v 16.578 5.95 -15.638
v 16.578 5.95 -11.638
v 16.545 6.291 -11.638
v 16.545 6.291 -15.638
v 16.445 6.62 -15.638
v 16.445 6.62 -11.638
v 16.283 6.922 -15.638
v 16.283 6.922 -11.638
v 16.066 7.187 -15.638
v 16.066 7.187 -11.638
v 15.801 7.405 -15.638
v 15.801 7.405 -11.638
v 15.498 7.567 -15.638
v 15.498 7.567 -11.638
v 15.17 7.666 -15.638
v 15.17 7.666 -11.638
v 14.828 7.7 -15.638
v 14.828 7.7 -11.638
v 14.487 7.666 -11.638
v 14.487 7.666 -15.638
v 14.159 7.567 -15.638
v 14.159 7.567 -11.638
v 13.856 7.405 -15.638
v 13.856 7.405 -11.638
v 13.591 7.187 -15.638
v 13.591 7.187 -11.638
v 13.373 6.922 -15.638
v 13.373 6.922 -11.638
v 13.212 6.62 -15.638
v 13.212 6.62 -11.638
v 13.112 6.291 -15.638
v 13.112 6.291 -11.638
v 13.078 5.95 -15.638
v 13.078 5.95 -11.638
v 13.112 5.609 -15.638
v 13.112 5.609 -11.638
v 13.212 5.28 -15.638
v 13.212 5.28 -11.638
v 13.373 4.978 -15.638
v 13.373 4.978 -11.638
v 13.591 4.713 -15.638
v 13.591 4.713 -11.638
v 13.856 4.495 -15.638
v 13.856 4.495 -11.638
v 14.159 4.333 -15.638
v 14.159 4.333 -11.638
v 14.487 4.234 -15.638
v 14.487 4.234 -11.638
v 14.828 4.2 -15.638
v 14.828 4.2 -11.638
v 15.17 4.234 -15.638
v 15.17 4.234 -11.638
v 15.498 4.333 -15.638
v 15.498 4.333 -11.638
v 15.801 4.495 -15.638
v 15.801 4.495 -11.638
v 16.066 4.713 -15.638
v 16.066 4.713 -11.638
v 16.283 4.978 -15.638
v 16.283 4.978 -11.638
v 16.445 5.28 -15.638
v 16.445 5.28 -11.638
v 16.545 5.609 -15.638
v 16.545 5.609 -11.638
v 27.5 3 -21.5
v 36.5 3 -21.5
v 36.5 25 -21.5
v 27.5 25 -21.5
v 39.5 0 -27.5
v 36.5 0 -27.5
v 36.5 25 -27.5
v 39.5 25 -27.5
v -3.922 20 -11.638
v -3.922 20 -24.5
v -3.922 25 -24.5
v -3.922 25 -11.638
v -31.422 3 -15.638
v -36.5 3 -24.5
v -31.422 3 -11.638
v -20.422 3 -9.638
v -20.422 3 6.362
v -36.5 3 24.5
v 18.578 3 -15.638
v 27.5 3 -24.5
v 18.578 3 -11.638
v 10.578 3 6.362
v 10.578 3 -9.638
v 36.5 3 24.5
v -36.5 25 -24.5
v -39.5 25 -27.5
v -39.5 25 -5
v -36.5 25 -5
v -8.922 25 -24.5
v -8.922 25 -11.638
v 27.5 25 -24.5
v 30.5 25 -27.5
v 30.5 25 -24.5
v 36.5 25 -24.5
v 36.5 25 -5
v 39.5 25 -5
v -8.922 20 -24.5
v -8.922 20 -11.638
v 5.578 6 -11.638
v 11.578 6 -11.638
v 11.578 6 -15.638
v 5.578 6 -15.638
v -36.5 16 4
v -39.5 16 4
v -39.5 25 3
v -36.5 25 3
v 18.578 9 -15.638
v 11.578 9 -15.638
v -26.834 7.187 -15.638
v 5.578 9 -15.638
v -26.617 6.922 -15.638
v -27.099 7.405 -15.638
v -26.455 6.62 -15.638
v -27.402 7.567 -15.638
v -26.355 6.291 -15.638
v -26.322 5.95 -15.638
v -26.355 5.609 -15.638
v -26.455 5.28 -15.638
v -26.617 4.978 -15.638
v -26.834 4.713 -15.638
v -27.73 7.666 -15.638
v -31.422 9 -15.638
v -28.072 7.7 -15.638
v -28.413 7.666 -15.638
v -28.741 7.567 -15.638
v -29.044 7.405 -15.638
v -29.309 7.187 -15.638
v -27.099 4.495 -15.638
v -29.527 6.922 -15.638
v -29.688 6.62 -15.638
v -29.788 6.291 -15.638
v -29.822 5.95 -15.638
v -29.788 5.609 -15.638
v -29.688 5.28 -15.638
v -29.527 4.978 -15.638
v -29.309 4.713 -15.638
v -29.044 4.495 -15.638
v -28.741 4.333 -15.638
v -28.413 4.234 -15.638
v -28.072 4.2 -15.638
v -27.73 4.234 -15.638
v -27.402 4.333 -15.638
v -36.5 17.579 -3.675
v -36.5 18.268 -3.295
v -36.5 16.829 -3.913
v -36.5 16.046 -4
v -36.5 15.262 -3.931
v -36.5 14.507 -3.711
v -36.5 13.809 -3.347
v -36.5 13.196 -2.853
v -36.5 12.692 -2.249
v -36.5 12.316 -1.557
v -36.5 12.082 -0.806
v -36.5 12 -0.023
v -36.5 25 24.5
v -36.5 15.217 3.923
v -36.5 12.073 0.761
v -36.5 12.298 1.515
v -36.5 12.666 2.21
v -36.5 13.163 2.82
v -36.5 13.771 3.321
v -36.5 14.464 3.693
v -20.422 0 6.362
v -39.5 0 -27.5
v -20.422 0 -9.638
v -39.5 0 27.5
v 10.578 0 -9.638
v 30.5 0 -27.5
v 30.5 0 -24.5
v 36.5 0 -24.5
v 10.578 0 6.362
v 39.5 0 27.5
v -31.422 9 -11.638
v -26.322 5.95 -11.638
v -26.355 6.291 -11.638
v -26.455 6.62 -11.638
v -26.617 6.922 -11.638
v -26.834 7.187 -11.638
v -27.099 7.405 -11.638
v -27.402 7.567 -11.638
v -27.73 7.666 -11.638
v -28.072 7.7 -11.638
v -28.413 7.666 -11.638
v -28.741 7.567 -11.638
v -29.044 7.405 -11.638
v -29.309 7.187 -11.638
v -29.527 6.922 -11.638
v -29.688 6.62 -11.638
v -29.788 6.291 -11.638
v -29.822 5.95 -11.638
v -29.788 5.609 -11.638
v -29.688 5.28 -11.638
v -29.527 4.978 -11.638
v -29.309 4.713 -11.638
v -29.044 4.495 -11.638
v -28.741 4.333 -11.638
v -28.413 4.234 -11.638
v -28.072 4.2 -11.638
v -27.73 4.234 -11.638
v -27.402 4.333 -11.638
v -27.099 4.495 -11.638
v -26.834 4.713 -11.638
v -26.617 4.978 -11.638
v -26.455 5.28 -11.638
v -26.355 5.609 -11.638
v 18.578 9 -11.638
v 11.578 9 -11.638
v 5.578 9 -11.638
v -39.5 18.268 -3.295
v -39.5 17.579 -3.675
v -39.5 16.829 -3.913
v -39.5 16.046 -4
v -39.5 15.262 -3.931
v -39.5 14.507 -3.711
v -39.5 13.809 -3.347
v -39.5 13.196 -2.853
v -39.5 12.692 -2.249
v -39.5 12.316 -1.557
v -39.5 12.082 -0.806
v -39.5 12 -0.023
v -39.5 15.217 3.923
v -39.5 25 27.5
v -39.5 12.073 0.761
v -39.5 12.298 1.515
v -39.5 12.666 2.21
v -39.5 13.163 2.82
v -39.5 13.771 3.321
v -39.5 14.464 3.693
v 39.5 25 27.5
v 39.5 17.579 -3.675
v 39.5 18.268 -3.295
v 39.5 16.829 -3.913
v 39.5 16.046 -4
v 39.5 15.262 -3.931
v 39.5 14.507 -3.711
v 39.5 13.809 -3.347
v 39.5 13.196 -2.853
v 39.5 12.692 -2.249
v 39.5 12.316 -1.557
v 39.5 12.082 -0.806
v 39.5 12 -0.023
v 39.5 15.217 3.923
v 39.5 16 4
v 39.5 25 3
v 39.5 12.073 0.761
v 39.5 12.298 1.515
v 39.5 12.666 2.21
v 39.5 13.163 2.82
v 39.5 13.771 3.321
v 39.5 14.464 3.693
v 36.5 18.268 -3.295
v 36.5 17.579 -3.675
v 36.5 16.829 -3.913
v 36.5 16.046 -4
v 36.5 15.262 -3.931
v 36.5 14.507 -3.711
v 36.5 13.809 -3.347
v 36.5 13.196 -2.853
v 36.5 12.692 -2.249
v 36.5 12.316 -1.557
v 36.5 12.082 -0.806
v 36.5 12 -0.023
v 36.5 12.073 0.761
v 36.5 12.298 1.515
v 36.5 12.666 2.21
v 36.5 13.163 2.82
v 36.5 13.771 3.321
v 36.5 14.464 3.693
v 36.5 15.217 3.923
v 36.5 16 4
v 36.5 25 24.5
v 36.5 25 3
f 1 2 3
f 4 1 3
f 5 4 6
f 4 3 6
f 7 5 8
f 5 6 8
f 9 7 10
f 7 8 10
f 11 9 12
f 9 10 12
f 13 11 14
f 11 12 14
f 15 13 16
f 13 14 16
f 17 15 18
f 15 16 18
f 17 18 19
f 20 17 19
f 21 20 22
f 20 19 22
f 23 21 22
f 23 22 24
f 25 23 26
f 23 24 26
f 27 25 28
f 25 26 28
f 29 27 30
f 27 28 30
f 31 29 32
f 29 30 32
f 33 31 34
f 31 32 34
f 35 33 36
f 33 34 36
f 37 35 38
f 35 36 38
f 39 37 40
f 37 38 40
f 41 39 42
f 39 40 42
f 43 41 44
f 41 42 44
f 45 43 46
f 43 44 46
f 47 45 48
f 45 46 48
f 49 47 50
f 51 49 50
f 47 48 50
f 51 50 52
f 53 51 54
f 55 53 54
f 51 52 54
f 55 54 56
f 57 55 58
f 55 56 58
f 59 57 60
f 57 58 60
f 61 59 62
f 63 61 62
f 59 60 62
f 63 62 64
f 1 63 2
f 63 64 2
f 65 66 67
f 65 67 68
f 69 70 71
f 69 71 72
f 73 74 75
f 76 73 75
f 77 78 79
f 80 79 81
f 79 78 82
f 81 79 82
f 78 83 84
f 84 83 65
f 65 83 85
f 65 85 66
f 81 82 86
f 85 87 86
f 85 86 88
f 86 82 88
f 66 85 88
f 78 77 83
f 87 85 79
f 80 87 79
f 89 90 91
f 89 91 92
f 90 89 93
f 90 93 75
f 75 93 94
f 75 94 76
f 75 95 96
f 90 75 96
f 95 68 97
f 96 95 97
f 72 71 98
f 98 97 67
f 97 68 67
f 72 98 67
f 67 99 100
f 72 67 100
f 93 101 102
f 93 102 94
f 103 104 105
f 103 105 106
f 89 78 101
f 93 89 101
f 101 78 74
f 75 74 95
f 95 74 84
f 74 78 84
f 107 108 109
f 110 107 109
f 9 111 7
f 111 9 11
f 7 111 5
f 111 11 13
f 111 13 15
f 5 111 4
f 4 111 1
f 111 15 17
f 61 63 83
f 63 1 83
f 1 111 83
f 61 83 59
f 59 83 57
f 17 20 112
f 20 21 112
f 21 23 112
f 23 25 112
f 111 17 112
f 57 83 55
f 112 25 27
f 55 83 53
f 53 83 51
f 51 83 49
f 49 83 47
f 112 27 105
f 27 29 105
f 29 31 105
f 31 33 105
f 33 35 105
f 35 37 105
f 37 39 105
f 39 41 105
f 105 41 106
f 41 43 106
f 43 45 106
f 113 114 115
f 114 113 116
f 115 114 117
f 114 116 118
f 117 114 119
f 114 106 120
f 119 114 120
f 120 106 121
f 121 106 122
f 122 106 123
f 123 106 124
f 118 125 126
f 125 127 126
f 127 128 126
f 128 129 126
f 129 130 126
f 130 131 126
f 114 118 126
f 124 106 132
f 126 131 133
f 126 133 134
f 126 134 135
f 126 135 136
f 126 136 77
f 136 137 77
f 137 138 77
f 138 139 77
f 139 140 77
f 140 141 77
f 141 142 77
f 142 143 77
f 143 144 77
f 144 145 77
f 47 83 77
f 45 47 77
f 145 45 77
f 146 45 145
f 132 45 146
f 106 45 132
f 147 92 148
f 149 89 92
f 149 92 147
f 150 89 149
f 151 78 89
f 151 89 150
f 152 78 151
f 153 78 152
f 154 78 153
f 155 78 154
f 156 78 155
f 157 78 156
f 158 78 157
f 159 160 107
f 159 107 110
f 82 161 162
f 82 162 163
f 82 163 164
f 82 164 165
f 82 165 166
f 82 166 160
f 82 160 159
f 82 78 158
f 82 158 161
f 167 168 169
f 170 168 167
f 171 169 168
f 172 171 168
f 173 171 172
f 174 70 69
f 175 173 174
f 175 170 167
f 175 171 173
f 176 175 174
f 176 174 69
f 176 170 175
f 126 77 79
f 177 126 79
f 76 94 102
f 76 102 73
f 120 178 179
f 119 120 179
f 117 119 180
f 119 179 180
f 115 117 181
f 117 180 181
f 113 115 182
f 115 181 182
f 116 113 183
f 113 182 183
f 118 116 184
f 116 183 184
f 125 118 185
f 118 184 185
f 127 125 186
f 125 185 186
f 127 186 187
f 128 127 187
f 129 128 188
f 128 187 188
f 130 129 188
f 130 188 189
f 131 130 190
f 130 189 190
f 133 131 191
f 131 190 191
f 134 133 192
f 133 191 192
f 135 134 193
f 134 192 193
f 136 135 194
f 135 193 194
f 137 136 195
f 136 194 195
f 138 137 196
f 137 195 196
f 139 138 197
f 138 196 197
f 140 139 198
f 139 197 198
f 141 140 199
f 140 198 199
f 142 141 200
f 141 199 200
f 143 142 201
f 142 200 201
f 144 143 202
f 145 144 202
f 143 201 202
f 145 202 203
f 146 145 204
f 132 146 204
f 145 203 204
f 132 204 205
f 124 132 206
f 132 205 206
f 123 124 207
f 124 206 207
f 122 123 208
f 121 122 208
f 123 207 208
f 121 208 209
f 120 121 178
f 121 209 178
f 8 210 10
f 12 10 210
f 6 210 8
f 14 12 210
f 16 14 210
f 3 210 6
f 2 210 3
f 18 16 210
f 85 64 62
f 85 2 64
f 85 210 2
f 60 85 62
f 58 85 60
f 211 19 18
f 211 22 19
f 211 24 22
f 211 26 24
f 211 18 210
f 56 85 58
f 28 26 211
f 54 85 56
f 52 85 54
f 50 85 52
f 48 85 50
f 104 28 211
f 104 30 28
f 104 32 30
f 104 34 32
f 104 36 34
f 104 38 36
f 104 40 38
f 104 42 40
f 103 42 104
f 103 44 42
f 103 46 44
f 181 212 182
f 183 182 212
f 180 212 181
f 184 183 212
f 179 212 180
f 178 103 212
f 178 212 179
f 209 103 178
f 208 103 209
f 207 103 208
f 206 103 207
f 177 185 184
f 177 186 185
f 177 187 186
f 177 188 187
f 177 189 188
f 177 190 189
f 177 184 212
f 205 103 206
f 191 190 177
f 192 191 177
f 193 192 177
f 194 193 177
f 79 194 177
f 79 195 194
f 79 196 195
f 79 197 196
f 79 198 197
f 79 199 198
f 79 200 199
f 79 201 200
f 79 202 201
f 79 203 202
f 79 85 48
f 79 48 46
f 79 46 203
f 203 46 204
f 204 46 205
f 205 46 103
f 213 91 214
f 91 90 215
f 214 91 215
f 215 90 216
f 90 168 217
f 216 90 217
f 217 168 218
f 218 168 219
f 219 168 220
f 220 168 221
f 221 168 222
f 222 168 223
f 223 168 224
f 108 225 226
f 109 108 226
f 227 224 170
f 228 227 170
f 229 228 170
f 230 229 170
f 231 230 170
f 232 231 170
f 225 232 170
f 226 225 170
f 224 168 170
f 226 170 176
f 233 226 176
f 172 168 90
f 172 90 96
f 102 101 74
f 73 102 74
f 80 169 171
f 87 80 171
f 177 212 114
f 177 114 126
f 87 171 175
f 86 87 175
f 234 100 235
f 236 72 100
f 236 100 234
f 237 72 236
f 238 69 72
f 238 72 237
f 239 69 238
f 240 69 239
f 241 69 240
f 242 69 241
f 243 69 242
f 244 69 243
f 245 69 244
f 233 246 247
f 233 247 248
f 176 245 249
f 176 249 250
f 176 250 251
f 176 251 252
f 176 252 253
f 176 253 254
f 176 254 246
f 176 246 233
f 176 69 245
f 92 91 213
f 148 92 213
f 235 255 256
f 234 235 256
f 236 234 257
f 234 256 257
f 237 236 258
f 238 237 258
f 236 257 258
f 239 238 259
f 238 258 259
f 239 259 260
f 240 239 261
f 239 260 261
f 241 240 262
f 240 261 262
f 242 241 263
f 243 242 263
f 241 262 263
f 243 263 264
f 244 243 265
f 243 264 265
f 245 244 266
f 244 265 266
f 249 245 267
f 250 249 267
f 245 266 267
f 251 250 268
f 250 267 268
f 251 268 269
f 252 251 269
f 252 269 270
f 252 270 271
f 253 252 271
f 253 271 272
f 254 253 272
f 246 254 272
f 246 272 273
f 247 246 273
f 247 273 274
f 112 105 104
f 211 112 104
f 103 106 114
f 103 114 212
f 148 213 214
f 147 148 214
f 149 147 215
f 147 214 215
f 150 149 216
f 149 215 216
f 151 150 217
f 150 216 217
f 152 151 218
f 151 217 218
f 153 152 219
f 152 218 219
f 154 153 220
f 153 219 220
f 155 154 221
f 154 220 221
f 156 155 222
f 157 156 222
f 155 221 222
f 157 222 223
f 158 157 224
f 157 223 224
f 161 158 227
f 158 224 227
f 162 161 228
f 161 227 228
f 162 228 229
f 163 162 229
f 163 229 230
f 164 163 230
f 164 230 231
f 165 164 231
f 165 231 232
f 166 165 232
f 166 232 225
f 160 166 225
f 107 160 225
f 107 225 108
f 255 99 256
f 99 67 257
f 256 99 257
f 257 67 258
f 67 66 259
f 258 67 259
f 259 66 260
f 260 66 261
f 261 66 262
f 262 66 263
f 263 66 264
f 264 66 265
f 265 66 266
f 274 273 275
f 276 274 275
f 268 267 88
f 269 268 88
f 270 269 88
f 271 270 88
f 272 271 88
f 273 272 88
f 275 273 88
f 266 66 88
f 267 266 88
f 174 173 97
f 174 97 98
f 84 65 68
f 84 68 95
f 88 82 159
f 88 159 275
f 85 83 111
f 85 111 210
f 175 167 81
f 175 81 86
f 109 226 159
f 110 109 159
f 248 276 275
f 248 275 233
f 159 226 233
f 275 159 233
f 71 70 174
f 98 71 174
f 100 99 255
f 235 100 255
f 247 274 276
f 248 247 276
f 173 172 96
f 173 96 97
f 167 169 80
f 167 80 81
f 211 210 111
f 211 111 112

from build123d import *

# Parameters (mm, degrees)
F0_W      = 79
F0_H      = 55
F0_W_2    = 73
F0_H_2    = 49
F1_DEPTH  = 25
F3_DEPTH  = 79
F0_W_3    = 31
F0_H_3    = 16
F4_DEPTH  = 3
F5_W      = 6
F5_H      = 4
F6_DEPTH  = 3
F5_W_2    = 37
F5_W_3    = 7
F7_DEPTH  = 6
F8_W      = 5
F8_H      = 5
F9_DEPTH  = 12.86194
F10_R     = 1.75
F11_DEPTH = 4
F12_W     = 6
F12_H     = 3
F13_DEPTH = 25
F14_DEPTH = 25


with BuildPart() as f1:
    # F0 (on Front) → F1 (new body)
    with BuildSketch(Plane.XZ):
        Rectangle(F0_W, F0_H)
        Rectangle(F0_W_2, F0_H_2, mode=Mode.SUBTRACT)
    extrude(amount=-F1_DEPTH)

    # F2 (on face) → F3 (cut, through all)
    with BuildSketch(Plane(origin=(-39.5, 0, 0), x_dir=(0, -1, 0), z_dir=(-1, 0, 0))):
        with BuildLine():
            Line((-25, -5), (-18.267742, -3.295049))
            ThreePointArc((-18.267742, -3.295049), (-12.180301, -1.187393), (-16, 4))
            Line((-16, 4), (-16.878049, 3.902439))
            Line((-16.878049, 3.902439), (-25, 3))
            Line((-25, 3), (-25, -5))
        make_face()
    extrude(amount=-F3_DEPTH, mode=Mode.SUBTRACT)

    # F0 (on Front) → F4 (join)
    with BuildSketch(Plane.XZ):
        Rectangle(F0_W_2, F0_H_2)
        with Locations((-4.921641, -1.63806)):
            Rectangle(F0_W_3, F0_H_3, mode=Mode.SUBTRACT)
    extrude(amount=-F4_DEPTH)

    # F5 (on face) → F6 (join)
    with BuildSketch(Plane(origin=(0, 3, 0), x_dir=(-1, 0, 0), z_dir=(0, 1, 0))):
        with Locations((-8.578359, -13.63806)):
            Rectangle(F5_W, F5_H)
    extrude(amount=F6_DEPTH)

    # F5 (on face) → F7 (join)
    with BuildSketch(Plane(origin=(0, 3, 0), x_dir=(-1, 0, 0), z_dir=(0, 1, 0))):
        with Locations((12.921641, -13.63806)):
            Rectangle(F5_W_2, F5_H)
        with Locations((-15.078359, -13.63806)):
            Rectangle(F5_W_3, F5_H)
    extrude(amount=F7_DEPTH)

    # F8 (on face) → F9 (join)
    with BuildSketch(Plane.XY.offset(-24.5)):
        with Locations((-6.421641, 22.5)):
            Rectangle(F8_W, F8_H)
    extrude(amount=F9_DEPTH)

    # F10 (on face) → F11 (cut, through all)
    with BuildSketch(Plane.XY.offset(-11.63806)):
        with Locations((14.828359, 5.95)):
            Circle(F10_R)
        with Locations((-28.071641, 5.95)):
            Circle(F10_R)
    extrude(amount=-F11_DEPTH, mode=Mode.SUBTRACT)

    # F12 (on face) → F13 (cut, through all)
    with BuildSketch(Plane.XZ):
        with Locations((33.5, -26)):
            Rectangle(F12_W, F12_H)
    extrude(amount=-F13_DEPTH, mode=Mode.SUBTRACT)

    # F12 (on face) → F14 (join, through all)
    with BuildSketch(Plane.XZ):
        Polygon((27.5, -27.5), (30.5, -27.5), (30.5, -24.5), (36.5, -24.5), (36.5, -21.5), (27.5, -21.5), align=None)
    extrude(amount=-F14_DEPTH)


solid = f1.part
